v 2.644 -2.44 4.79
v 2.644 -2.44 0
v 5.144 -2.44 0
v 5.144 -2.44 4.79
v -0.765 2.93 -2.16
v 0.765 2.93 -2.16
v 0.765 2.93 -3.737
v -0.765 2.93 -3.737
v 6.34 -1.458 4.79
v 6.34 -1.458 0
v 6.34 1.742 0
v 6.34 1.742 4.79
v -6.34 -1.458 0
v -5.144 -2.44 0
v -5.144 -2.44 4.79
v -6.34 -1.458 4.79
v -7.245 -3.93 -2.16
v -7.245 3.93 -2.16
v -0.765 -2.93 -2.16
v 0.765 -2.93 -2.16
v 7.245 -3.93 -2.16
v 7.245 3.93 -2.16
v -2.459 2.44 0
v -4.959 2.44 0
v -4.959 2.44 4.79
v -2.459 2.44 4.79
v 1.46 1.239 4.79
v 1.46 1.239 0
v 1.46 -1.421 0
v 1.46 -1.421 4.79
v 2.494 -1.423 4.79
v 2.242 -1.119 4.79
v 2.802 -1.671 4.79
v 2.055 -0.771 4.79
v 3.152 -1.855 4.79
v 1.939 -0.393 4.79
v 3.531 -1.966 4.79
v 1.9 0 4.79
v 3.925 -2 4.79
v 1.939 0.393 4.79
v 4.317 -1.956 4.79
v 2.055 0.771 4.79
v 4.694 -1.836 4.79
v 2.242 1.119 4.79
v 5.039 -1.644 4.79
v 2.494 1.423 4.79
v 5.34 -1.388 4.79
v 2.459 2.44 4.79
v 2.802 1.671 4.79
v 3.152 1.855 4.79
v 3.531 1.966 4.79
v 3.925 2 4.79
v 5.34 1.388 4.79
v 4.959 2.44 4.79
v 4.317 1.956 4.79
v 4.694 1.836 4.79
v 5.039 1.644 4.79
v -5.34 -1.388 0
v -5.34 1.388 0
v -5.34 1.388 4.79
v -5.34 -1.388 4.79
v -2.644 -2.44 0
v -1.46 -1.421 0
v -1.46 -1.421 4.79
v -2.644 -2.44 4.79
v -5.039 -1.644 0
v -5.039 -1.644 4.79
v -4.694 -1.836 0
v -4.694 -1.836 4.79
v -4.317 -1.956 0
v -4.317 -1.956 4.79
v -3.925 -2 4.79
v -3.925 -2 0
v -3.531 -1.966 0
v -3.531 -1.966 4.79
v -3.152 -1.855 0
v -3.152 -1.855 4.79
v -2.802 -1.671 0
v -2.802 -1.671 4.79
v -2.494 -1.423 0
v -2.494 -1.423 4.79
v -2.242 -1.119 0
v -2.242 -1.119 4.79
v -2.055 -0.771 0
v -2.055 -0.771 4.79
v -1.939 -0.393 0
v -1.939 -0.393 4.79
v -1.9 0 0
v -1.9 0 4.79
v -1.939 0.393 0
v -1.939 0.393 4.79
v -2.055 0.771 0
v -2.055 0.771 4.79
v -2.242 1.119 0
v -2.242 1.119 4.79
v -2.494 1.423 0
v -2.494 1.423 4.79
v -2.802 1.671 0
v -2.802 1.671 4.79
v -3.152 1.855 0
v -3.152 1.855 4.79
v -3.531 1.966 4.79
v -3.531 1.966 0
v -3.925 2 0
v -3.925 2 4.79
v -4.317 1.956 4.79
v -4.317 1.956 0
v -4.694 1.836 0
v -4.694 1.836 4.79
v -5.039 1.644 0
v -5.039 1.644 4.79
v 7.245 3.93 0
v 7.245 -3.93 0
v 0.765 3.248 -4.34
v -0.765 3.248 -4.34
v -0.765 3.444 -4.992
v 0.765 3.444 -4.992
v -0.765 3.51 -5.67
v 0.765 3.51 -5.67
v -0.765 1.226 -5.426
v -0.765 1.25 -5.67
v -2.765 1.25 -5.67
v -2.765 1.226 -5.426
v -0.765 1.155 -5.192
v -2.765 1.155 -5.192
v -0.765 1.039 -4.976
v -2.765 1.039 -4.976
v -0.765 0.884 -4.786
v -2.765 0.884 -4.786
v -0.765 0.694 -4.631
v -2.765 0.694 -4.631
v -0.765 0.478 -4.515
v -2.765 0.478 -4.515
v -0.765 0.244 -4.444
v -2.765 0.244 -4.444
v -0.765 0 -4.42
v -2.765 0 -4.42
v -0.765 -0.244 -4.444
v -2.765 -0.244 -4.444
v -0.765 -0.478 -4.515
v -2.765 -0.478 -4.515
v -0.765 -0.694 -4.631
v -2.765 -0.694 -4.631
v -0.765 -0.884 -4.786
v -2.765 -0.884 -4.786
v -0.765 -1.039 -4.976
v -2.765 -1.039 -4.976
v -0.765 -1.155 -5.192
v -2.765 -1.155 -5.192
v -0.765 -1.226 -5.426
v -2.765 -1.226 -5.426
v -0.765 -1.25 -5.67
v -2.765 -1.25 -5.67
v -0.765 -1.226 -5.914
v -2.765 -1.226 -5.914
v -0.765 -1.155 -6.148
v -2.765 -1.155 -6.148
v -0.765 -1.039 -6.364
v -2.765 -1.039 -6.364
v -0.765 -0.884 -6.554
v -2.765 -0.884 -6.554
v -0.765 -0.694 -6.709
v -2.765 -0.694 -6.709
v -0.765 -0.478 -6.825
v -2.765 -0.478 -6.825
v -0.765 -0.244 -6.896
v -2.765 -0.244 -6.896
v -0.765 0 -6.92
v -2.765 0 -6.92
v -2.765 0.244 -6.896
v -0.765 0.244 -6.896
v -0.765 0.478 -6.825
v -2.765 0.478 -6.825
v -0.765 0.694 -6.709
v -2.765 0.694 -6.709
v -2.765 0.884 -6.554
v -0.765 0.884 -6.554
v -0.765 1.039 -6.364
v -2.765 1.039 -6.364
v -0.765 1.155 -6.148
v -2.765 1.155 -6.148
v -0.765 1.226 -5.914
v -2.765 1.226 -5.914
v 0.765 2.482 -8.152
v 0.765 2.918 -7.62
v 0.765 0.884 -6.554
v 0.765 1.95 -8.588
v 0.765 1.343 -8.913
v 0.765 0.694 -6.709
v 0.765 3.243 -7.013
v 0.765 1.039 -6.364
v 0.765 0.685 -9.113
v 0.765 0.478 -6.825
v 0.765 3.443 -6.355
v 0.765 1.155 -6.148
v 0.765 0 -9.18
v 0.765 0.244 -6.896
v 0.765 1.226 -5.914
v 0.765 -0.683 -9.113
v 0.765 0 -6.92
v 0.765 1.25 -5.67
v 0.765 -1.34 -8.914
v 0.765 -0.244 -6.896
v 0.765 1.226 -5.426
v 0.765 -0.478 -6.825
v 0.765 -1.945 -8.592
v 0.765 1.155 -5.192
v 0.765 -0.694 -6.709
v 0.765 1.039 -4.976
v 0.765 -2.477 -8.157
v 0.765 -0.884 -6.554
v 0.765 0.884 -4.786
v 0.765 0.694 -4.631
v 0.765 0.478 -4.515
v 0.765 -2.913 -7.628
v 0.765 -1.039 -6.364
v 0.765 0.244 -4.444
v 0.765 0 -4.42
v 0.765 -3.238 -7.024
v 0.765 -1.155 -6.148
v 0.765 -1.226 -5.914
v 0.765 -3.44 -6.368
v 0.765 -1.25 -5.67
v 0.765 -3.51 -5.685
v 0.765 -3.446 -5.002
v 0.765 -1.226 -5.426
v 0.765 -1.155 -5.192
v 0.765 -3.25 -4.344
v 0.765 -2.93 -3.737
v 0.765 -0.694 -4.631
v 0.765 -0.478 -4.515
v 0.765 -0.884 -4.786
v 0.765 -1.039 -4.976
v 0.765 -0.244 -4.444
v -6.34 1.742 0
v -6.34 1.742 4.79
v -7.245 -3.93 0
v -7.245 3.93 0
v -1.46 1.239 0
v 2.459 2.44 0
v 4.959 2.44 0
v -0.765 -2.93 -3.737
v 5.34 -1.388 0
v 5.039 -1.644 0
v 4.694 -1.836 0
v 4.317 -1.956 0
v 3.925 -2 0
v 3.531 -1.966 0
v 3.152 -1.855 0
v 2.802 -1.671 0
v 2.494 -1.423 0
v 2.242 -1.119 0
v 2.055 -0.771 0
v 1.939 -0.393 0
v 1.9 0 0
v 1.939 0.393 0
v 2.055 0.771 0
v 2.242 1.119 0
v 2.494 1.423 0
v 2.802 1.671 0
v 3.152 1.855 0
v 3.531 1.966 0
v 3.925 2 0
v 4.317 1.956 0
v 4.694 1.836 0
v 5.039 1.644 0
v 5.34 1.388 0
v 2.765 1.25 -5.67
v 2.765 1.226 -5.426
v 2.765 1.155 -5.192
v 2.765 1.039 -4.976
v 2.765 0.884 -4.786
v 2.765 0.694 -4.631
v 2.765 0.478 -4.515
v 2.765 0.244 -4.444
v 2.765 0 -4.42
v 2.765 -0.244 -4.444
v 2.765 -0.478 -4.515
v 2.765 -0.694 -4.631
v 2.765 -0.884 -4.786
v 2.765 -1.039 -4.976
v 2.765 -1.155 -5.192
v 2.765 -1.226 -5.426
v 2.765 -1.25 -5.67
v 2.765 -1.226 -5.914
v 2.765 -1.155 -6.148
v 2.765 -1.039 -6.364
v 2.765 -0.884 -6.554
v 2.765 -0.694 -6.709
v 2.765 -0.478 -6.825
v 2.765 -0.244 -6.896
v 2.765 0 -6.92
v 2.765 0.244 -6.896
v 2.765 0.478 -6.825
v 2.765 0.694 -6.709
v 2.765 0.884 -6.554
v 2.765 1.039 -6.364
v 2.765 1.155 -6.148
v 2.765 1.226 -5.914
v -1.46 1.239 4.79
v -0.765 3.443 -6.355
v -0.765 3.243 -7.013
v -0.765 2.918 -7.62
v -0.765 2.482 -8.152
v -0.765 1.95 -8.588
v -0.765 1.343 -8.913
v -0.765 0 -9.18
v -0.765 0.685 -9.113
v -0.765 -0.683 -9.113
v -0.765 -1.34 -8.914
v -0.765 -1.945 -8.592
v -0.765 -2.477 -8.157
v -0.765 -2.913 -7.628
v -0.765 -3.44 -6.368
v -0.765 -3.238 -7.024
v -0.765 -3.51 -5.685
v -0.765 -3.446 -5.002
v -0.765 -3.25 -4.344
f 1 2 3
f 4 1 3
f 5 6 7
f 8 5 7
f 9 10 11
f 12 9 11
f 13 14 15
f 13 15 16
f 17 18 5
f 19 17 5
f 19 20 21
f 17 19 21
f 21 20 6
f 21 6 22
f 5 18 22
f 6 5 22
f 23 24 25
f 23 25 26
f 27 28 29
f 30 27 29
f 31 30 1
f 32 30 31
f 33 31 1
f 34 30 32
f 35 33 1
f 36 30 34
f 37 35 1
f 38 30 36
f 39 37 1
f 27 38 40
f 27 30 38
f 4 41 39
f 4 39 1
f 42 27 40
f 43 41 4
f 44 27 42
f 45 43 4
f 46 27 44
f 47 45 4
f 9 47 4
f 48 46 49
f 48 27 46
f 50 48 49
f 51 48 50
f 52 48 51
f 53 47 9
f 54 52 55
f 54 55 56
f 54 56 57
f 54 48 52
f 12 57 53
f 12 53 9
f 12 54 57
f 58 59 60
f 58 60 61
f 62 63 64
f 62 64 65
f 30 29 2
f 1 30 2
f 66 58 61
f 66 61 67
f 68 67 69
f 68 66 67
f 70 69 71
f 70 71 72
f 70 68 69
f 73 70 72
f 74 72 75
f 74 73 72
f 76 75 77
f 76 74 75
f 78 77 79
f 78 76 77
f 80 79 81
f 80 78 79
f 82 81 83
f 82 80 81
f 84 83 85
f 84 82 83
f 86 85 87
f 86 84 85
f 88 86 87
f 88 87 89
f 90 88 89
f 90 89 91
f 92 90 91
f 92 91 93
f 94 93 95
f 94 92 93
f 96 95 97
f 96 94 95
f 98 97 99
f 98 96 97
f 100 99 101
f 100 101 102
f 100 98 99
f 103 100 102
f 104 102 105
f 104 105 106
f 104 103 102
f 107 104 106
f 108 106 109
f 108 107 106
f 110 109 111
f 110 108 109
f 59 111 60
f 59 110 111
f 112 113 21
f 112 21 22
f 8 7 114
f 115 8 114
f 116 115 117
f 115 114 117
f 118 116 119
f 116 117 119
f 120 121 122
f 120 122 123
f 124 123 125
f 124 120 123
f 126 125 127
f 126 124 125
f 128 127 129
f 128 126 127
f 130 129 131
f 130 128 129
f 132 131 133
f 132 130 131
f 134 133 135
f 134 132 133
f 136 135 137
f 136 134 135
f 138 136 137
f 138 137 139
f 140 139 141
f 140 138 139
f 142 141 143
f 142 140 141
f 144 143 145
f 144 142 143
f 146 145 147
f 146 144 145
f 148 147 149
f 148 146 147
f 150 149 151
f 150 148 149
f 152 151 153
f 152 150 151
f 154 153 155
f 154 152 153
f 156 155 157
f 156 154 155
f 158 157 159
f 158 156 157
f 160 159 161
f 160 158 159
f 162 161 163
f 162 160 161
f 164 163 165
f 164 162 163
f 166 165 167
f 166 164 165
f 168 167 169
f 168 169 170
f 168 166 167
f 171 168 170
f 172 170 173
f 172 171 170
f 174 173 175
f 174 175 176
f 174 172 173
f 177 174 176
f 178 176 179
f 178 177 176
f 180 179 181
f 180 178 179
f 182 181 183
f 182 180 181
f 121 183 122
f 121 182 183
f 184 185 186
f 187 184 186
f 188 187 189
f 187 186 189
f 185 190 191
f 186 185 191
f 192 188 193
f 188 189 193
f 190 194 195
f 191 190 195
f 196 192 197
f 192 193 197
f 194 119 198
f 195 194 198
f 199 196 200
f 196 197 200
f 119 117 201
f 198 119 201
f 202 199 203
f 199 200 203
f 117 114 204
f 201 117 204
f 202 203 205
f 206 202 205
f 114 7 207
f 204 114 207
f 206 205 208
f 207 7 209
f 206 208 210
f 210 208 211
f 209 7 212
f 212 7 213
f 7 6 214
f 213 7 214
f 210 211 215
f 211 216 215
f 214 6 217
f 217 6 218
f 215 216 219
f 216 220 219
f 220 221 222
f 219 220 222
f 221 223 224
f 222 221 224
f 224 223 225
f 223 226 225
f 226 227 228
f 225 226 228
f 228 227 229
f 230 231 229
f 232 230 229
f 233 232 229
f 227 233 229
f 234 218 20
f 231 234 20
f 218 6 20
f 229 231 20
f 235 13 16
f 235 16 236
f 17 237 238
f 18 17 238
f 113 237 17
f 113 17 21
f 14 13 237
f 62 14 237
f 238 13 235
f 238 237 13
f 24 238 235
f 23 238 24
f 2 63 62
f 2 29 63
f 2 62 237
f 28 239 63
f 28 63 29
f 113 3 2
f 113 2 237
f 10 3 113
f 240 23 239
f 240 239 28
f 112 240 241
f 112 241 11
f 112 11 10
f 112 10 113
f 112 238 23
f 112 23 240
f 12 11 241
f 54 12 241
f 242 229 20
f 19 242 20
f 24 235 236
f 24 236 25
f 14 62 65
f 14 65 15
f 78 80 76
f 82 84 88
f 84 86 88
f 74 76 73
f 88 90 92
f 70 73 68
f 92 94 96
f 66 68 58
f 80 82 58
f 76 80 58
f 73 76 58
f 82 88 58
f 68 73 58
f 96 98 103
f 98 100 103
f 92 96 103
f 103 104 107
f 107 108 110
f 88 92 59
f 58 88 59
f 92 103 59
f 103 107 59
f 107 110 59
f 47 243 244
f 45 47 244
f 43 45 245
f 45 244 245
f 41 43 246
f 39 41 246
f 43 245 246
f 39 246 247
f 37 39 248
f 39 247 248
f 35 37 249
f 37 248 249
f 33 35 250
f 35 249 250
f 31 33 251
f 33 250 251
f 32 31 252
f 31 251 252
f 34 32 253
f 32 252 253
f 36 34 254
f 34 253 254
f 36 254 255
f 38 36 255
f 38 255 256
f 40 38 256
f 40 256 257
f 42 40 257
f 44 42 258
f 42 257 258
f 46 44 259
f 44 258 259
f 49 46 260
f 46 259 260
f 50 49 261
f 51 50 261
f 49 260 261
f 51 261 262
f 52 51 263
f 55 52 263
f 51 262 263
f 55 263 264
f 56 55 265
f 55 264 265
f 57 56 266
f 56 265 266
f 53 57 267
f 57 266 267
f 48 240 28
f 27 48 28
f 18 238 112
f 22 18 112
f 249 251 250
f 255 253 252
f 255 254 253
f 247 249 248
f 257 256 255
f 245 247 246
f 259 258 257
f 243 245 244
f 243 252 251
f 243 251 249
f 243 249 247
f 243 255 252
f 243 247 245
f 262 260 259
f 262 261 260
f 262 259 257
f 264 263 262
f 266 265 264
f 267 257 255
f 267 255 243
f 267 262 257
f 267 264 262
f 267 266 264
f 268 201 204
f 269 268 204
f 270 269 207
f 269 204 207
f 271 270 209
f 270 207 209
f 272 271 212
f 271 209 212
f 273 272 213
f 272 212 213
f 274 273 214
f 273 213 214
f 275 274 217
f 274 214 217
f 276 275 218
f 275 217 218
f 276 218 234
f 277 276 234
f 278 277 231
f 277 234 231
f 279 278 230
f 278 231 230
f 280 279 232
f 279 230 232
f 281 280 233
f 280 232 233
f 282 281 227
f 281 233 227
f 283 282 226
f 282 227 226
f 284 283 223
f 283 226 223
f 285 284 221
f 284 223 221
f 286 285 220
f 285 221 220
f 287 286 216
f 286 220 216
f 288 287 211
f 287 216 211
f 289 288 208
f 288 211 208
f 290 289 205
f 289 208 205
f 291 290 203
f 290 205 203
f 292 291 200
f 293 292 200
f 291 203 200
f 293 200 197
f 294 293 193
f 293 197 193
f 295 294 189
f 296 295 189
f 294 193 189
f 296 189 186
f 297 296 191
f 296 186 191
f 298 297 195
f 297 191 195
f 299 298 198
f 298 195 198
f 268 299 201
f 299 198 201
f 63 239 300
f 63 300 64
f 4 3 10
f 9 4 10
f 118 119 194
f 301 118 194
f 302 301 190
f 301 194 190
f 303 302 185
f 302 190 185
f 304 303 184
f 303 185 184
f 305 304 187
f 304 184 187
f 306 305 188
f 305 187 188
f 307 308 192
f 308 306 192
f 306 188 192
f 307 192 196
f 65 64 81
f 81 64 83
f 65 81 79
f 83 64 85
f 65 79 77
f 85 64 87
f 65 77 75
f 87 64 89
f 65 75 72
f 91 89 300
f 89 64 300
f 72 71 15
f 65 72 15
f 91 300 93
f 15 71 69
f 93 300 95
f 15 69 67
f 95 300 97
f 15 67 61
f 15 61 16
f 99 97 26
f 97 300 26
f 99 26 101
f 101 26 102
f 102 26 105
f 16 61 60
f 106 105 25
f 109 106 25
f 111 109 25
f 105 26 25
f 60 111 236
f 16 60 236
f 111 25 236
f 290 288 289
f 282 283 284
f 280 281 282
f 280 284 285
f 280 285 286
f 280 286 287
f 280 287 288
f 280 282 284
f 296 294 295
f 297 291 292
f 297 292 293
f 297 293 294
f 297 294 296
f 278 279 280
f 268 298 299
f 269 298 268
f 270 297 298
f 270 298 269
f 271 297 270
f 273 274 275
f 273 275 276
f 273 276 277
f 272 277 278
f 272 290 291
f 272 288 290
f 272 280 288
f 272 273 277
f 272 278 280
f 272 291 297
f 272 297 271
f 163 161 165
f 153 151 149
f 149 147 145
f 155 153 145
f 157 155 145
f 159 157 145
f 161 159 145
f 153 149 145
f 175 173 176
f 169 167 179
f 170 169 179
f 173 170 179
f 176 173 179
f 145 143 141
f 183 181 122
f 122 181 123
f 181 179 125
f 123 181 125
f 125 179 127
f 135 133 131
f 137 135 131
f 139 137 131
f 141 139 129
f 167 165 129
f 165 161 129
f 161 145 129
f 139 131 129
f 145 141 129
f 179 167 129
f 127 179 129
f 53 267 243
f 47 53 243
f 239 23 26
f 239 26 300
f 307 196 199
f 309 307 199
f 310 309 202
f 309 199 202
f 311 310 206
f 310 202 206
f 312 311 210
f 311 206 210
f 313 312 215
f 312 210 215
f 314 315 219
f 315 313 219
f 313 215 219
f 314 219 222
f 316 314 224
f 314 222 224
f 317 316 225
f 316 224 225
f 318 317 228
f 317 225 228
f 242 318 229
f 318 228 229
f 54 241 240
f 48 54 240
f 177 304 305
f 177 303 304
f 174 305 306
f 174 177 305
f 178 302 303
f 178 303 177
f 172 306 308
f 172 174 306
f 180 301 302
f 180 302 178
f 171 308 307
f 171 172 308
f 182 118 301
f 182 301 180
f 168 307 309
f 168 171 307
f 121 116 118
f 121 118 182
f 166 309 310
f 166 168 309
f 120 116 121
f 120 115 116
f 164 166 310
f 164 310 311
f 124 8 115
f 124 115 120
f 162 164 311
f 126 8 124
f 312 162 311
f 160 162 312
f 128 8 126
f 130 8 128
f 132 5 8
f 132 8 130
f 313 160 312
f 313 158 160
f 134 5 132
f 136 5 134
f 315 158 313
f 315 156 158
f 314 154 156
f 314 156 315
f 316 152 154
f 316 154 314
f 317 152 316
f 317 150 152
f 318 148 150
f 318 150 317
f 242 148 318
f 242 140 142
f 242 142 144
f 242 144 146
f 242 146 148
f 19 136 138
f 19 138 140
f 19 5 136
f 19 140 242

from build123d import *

# Parameters (mm, degrees)
F0_W     = 14.49
F0_H     = 7.86
F1_DEPTH = 2.16
F2_W     = 1.53
F2_H     = 7.86
F3_DEPTH = 7.02
F5_DEPTH = 8.011
F4_R     = 1.25
F6_DEPTH = 2
F9_DEPTH = 4.79


with BuildPart() as f1:
    # F0 (on Top) → F1 (new body)
    with BuildSketch(Plane.XY):
        Rectangle(F0_W, F0_H)
    extrude(amount=-F1_DEPTH)

    # F2 (on face) → F3 (join)
    with BuildSketch(Plane(origin=(0, 0, -2.16), x_dir=(1, 0, 0), z_dir=(0, 0, -1))):
        Rectangle(F2_W, F2_H)
    extrude(amount=F3_DEPTH)

    # F4 (on face) → F5 (cut, through all)
    with BuildSketch(Plane.YZ.offset(0.765)):
        with BuildLine():
            Line((-3.93, -9.18), (0, -9.18))
            ThreePointArc((0, -9.18), (-3.090612, -7.333797), (-2.93, -3.737333))
            Line((-2.93, -3.737333), (-2.93, -2.16))
            Line((-2.93, -2.16), (-3.93, -2.16))
            Line((-3.93, -2.16), (-3.93, -9.18))
        make_face()
        with BuildLine():
            ThreePointArc((2.93, -3.737333), (3.361874, -4.66109), (3.51, -5.67))
            ThreePointArc((3.51, -5.67), (2.481945, -8.151945), (0, -9.18))
            Line((0, -9.18), (3.93, -9.18))
            Line((3.93, -9.18), (3.93, -2.16))
            Line((3.93, -2.16), (2.93, -2.16))
            Line((2.93, -2.16), (2.93, -3.737333))
        make_face()
    extrude(amount=-F5_DEPTH, mode=Mode.SUBTRACT)

    # F4 (on face) → F6 (join)
    with BuildSketch(Plane.YZ.offset(0.765)):
        with Locations((0, -5.67)):
            Circle(F4_R)
    extrude(amount=F6_DEPTH)

    # F7: F1 across plane


with BuildPart() as f1_1:
    add(f1.part)
    add(f1.part.mirror(Plane.YZ))

    # F8 (on face) → F9 (join)
    with BuildSketch(Plane.XY):
        Polygon((4.95944, 2.44), (2.45944, 2.44), (1.46, 1.238976), (1.46, -1.421024), (2.644494, -2.44), (5.144494, -2.44), (6.34, -1.458122), (6.34, 1.741878), align=None)
        with BuildLine():
            ThreePointArc((5.34, 1.387948), (5.754724, 0.748331), (5.9, 0))
            ThreePointArc((5.9, 0), (5.754724, -0.748331), (5.34, -1.387948))
            ThreePointArc((5.34, -1.387948), (1.9, 0), (5.34, 1.387948))
        make_face(mode=Mode.SUBTRACT)
        with BuildLine():
            ThreePointArc((5.34, -1.387948), (5.754724, -0.748331), (5.9, 0))
            ThreePointArc((5.9, 0), (5.754724, 0.748331), (5.34, 1.387948))
            Line((5.34, 1.387948), (5.34, -1.387948))
        make_face()
    extrude(amount=F9_DEPTH)

    # F10: F1 across plane


with BuildPart() as f1_2:
    add(f1_1.part)
    add(f1_1.part.mirror(Plane.YZ))


solid = f1_2.part
